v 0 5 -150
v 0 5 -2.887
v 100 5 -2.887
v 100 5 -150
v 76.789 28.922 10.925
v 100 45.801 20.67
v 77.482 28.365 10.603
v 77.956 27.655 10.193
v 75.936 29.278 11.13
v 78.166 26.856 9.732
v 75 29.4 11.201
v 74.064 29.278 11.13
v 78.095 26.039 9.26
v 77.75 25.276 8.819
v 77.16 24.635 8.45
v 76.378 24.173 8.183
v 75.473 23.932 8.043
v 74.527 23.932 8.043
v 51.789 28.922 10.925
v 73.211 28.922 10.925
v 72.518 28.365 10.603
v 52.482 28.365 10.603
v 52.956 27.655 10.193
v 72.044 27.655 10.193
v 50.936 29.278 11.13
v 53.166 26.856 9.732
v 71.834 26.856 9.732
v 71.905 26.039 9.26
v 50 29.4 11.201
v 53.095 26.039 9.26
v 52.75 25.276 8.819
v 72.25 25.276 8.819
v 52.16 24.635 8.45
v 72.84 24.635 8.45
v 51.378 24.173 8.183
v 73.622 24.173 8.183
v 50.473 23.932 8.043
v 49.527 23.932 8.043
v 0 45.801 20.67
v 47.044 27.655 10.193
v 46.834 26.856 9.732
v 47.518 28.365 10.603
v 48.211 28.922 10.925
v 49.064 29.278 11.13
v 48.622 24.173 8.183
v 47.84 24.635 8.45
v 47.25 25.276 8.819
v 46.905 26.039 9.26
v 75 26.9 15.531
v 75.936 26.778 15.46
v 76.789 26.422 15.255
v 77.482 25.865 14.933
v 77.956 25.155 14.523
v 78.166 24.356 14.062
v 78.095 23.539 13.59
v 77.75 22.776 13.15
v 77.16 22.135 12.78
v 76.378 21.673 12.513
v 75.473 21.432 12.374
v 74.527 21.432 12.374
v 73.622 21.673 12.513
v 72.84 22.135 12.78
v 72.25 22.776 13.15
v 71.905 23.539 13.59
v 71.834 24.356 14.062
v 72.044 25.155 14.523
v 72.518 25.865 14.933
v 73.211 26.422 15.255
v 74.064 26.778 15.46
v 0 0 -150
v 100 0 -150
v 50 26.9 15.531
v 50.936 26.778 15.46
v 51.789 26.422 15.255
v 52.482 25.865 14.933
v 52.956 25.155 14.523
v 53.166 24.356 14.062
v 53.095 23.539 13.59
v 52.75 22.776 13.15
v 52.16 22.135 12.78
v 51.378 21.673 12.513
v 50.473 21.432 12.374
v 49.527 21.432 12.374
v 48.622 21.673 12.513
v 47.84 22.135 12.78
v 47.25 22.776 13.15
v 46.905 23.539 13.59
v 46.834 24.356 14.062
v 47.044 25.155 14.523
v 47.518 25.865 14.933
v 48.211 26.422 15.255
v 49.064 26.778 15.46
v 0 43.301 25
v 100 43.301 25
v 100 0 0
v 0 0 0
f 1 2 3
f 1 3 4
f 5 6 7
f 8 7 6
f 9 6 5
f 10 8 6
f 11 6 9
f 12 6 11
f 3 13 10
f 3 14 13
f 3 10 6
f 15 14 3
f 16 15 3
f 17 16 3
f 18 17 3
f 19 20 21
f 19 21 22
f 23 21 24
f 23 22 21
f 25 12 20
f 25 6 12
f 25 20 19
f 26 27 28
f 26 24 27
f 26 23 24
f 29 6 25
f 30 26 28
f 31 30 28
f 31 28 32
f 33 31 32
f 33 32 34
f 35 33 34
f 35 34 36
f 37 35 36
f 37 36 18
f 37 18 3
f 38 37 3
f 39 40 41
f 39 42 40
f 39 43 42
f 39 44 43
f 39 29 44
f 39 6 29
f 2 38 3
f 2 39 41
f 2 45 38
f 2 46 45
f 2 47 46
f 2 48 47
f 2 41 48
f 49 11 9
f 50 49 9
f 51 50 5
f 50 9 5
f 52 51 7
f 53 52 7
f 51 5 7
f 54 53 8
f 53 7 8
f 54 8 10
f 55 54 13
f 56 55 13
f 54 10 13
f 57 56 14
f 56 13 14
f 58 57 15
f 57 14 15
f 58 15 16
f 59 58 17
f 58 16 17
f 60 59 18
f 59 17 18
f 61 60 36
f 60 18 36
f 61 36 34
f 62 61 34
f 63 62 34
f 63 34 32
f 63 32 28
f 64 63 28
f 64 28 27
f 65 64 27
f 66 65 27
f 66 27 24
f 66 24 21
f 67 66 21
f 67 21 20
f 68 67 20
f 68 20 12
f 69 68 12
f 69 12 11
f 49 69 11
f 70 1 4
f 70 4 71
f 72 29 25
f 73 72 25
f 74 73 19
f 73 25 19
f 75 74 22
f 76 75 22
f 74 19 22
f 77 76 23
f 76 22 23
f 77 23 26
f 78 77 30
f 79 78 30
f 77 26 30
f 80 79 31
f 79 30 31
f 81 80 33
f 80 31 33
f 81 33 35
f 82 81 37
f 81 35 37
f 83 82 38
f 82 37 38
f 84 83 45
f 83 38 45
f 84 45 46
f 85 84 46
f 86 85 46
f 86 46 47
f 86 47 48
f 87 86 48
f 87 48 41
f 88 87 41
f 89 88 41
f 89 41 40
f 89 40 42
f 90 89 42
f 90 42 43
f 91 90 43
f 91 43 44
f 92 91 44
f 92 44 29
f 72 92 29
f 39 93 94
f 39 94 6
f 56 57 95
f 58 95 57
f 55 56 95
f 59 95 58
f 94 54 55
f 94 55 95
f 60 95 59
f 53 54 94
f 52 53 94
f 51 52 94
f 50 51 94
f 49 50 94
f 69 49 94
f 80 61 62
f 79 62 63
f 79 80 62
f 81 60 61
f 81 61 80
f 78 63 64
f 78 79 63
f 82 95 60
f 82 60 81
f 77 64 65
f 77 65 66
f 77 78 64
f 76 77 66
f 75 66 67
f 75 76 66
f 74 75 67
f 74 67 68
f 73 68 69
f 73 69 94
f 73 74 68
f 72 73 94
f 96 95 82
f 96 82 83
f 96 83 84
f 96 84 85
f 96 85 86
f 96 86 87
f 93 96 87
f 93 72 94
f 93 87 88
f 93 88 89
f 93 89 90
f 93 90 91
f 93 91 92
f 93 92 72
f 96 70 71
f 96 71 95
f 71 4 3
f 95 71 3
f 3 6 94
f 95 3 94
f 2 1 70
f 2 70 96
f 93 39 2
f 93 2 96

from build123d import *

# Parameters (mm, degrees)
BOSS_EXTRUDE1_DEPTH = 100
SKETCH2_R           = 3.175
CUT_EXTRUDE1_DEPTH  = 182.919520377


with BuildPart() as part:
    # Sketch1 → Boss-Extrude1 (new body)
    with BuildSketch(Plane(origin=(0, 0, 0), x_dir=(0, 0, -1), z_dir=(1, 0, 0))):
        Polygon((0, 0), (-25, 43.301270189), (-20.669872981, 45.801270189), (2.886751346, 5), (150, 5), (150, 0), align=None)
    extrude(amount=BOSS_EXTRUDE1_DEPTH)

    # Sketch2 → Cut-Extrude1 (cut, through all)
    with BuildSketch(Plane(origin=(0, 2.5, -4.330127019), x_dir=(-1, 0, 0), z_dir=(0, 0.49999999999999806, -0.8660254037844397))):
        with Locations(Location((-75, 27.886751346, 0), (0, 0, 90))):
            Circle(SKETCH2_R)
        with Locations(Location((-50, 27.886751346, 0), (0, 0, 90))):
            Circle(SKETCH2_R)
    extrude(amount=-CUT_EXTRUDE1_DEPTH, mode=Mode.SUBTRACT)


solid = part.part
